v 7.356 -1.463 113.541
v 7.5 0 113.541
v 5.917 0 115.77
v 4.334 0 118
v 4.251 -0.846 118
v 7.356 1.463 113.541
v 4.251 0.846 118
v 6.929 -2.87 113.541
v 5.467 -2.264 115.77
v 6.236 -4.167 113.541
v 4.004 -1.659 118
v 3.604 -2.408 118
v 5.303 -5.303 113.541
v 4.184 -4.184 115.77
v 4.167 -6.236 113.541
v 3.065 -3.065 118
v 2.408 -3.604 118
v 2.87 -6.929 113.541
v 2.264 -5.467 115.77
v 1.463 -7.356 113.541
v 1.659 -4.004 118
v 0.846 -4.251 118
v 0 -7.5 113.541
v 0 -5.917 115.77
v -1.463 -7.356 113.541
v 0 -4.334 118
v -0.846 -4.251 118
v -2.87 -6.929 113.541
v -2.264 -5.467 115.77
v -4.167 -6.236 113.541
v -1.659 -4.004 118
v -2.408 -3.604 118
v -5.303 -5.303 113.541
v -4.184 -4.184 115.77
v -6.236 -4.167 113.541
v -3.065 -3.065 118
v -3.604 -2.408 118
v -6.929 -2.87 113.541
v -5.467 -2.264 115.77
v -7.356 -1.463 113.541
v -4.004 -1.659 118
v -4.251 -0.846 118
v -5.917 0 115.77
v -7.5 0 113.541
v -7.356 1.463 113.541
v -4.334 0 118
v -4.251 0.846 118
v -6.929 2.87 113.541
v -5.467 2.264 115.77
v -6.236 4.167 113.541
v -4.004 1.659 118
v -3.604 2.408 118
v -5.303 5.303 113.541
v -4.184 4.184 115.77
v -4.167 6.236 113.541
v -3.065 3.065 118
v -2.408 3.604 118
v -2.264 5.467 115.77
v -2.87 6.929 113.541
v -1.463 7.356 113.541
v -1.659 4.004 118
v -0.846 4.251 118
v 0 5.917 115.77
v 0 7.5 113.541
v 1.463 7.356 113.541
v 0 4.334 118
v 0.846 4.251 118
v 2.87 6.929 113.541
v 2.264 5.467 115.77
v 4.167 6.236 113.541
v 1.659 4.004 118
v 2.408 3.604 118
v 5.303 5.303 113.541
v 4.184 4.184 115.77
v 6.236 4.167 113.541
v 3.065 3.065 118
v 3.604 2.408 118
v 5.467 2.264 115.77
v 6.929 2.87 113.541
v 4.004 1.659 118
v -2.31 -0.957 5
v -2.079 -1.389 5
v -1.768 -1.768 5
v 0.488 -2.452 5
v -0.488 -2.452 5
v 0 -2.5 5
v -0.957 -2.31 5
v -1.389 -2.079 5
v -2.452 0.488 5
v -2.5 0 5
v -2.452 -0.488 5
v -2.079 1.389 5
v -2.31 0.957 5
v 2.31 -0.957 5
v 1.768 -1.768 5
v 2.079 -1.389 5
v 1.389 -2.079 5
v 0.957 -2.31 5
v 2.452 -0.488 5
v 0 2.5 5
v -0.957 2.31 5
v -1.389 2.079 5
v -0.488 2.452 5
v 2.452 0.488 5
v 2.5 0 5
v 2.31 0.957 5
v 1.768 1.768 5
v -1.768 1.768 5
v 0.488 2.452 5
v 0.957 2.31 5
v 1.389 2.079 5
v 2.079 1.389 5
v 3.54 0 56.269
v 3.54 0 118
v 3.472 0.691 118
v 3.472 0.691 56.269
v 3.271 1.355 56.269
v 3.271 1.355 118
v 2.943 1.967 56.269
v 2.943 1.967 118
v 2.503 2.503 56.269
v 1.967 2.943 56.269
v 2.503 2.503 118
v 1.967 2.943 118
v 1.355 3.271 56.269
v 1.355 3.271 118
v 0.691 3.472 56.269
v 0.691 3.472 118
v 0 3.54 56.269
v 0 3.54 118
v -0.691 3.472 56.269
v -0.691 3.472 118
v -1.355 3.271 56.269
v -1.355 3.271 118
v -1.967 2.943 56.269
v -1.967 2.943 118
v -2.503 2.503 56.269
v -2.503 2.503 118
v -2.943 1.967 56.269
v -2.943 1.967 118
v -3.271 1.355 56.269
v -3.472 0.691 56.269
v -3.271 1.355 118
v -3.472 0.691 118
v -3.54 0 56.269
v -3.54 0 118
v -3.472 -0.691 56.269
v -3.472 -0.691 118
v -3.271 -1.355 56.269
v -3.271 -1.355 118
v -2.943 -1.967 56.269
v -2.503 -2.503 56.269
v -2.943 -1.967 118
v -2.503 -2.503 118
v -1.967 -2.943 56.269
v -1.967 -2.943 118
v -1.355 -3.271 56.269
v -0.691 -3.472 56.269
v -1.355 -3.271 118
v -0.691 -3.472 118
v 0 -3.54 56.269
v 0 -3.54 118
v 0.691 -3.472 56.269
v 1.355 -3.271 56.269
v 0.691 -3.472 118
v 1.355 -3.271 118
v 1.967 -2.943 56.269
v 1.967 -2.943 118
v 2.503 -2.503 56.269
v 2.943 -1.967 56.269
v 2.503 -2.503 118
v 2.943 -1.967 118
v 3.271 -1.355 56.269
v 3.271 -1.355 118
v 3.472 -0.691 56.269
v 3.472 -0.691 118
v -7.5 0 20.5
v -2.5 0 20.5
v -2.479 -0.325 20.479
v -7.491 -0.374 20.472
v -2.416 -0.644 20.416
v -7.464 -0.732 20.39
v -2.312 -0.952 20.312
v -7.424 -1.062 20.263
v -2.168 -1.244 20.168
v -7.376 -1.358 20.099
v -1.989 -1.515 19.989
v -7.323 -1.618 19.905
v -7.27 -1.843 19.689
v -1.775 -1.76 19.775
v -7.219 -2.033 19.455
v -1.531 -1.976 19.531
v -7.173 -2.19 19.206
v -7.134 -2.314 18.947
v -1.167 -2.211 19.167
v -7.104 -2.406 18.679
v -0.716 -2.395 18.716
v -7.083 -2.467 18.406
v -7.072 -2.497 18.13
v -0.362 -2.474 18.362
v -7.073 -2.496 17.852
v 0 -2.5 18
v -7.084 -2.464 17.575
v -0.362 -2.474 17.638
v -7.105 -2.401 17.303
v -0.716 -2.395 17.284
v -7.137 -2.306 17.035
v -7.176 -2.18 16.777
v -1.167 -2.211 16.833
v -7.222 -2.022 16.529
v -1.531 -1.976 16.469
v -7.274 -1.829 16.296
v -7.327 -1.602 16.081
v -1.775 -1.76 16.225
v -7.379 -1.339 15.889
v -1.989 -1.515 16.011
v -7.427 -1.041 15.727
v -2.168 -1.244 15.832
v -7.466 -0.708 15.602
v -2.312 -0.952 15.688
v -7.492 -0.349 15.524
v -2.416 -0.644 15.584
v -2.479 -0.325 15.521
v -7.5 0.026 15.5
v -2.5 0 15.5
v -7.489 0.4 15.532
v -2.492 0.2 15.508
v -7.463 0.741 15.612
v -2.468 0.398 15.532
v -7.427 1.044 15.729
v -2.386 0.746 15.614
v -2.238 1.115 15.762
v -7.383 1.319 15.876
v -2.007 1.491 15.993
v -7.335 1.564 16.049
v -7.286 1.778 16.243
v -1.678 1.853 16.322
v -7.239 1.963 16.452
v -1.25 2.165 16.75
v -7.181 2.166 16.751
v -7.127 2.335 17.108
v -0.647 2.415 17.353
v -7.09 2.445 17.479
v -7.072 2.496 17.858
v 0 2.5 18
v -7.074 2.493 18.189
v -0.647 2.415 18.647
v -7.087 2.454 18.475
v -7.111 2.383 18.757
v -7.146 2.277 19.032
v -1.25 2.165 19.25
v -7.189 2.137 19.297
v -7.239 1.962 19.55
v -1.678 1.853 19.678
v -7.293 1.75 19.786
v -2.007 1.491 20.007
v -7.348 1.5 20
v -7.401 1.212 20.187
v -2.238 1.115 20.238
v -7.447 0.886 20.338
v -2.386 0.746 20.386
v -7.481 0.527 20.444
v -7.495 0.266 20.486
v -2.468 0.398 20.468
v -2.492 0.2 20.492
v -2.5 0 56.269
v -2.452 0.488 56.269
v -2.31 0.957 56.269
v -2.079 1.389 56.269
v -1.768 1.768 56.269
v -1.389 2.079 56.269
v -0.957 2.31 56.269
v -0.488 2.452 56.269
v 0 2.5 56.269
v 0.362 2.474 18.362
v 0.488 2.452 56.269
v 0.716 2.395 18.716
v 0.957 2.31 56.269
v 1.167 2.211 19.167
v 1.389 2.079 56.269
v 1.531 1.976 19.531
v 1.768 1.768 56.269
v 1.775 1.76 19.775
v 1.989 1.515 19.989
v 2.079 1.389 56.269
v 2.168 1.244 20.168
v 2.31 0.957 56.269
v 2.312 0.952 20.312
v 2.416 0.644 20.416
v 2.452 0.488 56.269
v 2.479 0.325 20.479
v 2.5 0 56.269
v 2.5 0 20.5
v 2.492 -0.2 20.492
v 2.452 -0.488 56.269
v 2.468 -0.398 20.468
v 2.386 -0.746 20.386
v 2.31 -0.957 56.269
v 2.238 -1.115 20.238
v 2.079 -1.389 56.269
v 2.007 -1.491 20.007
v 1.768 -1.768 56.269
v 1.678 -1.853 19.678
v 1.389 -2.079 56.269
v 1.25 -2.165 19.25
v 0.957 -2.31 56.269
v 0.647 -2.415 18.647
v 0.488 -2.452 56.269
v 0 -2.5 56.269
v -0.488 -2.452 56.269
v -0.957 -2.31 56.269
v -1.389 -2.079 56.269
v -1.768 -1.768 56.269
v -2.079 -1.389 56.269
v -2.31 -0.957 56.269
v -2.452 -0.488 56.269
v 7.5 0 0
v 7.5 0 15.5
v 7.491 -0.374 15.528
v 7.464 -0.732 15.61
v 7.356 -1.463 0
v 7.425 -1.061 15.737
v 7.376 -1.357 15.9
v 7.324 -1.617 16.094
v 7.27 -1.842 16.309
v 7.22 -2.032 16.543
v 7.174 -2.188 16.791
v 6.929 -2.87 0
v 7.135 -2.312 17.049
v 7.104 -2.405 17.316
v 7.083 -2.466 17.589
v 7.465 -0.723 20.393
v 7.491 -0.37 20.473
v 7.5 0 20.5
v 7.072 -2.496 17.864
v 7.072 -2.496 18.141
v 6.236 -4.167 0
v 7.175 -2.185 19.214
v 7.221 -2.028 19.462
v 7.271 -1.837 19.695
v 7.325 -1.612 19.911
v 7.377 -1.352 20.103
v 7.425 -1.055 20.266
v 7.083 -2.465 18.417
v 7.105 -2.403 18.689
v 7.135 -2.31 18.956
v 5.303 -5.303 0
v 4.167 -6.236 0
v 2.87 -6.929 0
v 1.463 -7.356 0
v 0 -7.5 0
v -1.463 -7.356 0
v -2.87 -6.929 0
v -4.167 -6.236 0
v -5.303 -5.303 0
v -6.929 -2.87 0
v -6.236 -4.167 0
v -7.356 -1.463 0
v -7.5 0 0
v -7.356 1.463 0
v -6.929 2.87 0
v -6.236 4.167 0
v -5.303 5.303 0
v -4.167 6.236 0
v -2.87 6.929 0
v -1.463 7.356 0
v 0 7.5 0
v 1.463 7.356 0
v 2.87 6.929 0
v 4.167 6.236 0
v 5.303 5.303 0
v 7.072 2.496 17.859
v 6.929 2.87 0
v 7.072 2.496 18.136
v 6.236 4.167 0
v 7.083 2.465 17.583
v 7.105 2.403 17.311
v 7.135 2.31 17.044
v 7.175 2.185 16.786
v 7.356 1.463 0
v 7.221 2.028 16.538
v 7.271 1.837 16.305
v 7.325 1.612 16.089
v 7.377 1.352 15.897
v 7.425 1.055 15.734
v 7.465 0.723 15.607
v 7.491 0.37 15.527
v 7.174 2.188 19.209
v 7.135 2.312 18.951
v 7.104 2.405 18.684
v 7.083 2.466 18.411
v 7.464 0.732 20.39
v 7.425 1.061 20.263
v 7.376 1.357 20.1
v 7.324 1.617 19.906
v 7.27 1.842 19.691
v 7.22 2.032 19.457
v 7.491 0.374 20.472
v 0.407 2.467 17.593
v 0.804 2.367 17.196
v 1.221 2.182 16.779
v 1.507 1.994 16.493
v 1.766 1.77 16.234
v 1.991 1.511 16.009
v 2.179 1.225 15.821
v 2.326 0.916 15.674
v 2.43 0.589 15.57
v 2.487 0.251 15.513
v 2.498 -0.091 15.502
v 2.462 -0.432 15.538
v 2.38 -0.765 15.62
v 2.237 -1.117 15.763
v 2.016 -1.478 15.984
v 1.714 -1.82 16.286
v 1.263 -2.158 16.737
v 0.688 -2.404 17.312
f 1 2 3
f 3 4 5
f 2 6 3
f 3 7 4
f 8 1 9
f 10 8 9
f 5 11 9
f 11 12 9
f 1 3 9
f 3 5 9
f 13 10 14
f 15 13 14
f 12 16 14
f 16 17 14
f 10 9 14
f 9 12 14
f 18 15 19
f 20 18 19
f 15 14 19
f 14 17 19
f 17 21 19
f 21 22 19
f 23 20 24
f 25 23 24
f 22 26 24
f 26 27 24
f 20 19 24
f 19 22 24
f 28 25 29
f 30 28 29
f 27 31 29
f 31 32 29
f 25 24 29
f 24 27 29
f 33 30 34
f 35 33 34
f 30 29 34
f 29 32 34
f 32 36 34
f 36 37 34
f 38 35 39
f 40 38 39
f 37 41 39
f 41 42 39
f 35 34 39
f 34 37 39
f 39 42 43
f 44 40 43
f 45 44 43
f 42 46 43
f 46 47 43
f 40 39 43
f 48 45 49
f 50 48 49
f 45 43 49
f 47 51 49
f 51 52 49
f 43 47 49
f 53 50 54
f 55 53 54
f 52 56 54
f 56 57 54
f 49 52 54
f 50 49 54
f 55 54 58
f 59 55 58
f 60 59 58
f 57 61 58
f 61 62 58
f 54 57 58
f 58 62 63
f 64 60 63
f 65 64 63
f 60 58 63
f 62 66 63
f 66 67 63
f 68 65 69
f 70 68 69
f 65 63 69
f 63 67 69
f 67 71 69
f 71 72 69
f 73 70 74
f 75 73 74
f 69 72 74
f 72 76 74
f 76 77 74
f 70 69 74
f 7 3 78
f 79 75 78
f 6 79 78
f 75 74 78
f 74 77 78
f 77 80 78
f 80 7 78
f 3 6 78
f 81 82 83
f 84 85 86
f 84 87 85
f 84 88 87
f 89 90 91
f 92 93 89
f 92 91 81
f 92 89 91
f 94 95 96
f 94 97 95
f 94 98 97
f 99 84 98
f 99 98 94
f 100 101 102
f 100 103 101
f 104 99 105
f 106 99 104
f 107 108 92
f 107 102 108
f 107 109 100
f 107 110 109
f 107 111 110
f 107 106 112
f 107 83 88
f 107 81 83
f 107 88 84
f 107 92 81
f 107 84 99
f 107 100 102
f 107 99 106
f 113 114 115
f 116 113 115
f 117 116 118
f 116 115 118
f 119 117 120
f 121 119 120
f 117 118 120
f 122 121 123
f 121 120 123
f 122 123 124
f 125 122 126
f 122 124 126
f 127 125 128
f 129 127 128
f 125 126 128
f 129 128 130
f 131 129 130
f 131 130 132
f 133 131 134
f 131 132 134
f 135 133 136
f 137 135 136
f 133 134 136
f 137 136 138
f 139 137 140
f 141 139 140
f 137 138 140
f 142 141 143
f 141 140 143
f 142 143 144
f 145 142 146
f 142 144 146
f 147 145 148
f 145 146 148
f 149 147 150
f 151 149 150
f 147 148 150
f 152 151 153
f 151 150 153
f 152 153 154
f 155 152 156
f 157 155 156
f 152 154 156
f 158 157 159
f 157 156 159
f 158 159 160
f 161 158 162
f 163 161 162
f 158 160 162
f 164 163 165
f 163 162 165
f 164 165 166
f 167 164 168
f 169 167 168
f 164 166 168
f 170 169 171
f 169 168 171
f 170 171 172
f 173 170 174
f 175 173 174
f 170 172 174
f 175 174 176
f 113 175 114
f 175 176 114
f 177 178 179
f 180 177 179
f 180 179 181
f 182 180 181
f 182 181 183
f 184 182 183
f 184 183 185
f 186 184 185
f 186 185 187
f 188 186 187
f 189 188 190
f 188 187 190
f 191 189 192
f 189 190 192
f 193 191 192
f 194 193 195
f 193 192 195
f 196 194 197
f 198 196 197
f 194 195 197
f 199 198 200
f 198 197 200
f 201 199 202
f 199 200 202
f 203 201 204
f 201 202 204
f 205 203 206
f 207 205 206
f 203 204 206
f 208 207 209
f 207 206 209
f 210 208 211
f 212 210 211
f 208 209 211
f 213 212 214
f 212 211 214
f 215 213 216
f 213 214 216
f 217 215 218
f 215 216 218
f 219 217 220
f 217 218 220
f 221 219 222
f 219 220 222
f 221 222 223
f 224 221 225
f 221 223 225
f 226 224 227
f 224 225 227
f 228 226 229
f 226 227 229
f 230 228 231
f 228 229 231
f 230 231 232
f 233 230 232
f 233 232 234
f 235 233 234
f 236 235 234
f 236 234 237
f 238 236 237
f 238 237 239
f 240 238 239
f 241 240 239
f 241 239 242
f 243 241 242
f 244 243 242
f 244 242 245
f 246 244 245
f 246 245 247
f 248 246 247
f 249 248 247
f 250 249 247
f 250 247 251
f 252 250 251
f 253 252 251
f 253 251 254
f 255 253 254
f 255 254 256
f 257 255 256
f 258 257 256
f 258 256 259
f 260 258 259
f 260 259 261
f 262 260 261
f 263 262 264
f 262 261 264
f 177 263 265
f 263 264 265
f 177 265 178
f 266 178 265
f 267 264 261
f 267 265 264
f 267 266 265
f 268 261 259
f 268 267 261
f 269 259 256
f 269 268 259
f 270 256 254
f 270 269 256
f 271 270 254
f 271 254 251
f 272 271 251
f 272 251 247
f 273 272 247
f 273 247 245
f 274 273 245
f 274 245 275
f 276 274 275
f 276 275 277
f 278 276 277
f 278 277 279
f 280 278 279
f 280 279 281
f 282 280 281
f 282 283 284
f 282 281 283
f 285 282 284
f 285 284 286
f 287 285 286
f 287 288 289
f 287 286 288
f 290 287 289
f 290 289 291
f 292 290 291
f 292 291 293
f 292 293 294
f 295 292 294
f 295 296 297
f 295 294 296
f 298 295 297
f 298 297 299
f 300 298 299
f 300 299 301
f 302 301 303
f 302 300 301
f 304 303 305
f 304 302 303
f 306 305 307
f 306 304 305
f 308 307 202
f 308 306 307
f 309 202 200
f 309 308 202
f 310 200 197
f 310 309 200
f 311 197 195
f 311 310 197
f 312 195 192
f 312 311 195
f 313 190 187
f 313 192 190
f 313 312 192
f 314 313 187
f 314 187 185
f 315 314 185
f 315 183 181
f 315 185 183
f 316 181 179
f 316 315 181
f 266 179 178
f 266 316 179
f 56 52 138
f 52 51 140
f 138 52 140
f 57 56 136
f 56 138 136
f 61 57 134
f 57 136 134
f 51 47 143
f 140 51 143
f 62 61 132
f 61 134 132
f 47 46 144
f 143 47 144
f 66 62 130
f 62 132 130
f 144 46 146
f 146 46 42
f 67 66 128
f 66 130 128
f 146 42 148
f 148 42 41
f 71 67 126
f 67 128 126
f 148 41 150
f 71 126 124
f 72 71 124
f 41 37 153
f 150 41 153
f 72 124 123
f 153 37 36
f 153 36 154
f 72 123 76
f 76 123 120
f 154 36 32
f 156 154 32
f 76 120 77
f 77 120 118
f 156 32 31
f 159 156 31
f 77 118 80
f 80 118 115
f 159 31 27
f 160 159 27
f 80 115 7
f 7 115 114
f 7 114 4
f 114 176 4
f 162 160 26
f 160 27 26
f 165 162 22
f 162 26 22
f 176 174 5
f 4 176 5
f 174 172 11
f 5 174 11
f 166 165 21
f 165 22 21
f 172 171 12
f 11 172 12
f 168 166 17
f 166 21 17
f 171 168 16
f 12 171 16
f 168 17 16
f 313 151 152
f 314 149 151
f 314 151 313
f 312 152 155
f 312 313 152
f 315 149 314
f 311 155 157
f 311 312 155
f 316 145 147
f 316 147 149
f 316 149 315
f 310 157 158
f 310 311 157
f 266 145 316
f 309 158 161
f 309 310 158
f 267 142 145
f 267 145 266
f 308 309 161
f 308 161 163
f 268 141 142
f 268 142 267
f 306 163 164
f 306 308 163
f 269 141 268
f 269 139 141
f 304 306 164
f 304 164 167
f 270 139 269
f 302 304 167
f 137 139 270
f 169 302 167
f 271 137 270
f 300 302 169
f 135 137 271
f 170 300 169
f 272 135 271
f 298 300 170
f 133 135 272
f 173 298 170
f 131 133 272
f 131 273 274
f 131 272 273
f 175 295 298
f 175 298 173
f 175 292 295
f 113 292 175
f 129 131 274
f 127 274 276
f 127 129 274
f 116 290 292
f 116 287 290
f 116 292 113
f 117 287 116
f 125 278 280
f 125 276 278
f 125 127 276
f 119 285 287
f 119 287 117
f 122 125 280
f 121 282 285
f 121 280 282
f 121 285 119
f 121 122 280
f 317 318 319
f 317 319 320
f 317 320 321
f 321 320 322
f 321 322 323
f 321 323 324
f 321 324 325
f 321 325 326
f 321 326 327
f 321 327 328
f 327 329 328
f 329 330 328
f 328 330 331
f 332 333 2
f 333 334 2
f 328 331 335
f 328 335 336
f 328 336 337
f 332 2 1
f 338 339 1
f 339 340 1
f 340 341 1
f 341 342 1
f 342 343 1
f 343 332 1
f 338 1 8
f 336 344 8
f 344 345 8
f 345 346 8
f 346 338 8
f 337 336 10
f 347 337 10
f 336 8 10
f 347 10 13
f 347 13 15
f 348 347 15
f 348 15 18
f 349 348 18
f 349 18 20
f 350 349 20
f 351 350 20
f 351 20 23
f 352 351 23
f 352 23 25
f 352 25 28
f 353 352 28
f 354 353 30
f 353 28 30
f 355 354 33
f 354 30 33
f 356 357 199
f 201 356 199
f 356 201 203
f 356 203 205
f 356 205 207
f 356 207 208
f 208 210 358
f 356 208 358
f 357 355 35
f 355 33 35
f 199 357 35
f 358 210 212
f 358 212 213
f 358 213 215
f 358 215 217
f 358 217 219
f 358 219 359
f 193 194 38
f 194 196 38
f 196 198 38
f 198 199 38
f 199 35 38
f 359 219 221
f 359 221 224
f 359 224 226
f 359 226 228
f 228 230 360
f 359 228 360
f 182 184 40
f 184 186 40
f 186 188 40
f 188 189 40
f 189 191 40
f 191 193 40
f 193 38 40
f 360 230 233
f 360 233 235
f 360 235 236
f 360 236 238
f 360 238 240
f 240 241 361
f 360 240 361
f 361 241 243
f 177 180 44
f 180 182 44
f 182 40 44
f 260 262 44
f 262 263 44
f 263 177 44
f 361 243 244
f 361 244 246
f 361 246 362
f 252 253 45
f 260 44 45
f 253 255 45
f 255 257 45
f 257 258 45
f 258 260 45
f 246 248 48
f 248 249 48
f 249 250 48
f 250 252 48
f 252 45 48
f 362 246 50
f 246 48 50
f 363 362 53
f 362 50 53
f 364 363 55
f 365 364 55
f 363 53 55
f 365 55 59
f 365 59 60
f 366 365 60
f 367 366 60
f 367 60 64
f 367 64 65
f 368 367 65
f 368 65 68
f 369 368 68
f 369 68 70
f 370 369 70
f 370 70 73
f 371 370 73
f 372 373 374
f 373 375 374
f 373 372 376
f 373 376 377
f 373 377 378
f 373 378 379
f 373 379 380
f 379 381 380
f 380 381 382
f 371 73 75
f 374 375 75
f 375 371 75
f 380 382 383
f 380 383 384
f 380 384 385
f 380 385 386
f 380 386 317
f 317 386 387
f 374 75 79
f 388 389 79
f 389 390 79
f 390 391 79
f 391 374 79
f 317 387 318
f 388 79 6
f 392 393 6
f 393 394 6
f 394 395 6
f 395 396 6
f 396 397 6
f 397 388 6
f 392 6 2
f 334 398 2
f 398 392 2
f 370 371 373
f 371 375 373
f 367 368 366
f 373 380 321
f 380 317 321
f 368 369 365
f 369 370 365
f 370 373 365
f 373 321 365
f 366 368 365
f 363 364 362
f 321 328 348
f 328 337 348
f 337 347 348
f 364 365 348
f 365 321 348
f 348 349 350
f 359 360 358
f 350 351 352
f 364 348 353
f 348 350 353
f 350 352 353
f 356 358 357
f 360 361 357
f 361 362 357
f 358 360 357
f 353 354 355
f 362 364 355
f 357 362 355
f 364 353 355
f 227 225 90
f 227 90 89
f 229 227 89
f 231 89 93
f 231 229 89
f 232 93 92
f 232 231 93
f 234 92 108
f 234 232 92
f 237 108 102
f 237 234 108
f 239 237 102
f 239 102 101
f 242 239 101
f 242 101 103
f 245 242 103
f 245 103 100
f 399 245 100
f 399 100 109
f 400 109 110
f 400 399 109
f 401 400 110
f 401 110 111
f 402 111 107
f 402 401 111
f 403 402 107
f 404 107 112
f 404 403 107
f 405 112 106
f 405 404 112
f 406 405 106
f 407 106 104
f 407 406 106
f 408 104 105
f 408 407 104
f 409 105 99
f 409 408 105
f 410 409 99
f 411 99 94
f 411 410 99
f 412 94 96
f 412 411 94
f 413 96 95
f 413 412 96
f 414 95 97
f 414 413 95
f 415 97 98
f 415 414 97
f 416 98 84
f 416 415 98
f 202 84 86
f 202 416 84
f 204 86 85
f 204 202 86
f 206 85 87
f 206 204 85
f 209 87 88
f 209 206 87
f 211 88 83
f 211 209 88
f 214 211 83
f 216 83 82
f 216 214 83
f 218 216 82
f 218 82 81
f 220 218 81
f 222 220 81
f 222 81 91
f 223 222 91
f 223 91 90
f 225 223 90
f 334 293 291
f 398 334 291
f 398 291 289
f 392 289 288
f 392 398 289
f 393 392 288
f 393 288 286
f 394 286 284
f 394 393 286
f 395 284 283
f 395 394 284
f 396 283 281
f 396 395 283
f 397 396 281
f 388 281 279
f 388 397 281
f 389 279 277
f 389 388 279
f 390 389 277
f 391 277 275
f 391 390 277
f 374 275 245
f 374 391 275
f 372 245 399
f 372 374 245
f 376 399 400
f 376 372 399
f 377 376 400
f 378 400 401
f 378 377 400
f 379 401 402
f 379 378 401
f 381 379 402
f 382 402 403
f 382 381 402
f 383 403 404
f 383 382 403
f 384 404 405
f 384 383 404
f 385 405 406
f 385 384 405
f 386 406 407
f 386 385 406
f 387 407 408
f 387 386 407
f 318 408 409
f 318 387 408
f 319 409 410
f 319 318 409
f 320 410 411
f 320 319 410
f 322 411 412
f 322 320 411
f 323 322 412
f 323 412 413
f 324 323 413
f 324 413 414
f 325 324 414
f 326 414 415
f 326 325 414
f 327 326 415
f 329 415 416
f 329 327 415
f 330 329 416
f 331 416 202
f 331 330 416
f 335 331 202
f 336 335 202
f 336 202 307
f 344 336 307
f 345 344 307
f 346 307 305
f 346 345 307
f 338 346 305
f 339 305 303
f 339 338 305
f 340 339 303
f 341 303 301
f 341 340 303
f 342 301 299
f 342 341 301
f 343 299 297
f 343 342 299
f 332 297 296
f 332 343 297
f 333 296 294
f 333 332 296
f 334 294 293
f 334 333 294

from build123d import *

# Parameters (mm, degrees)
CROQUIS2_W                        = 2.5
CROQUIS2_H                        = 108
CROQUIS3_W                        = 7.5
CROQUIS3_H                        = 2.5
DI_METRO_DE_TALADRO_5_0_5_1_D     = 5
DI_METRO_DE_TALADRO_5_0_5_1_DEPTH = 15
CHAFL_N1_SIZE                     = 0.747946905
CHAFL_N1_SIZE2                    = 1.053583954
CROQUIS5_R                        = 3.54
CORTAR_EXTRUIR1_DEPTH             = 61.731439717


# Read off the part's stored shape, not the designer's step: Sólido importado2
with BuildPart() as part:
    # Croquis1 → Revolución1 (revolve)
    with BuildSketch(Plane.XZ):
        Polygon((4.334336082, 118), (0, 118), (0, 0), (7.5, 0), (7.5, 113.540736), align=None)
    revolve(axis=Axis((0, 0, 118), (0, 0, -1)))

    # Croquis2 → Cortar-Revolución1 (revolve, cut)
    with BuildSketch(Plane.XZ, mode=Mode.PRIVATE) as cortar_revoluci_n1_sk:
        with Locations((1.25, 59)):
            Rectangle(CROQUIS2_W, CROQUIS2_H)
    revolve(cortar_revoluci_n1_sk.sketch.rotate(Axis((0, 0, 113), (0, 0, -1)), 180), axis=Axis((0, 0, 113), (0, 0, -1)), mode=Mode.SUBTRACT)

    # Croquis3 → Cortar-Revolución2 (revolve, cut)
    with BuildSketch(Plane.XY.offset(18), mode=Mode.PRIVATE) as cortar_revoluci_n2_sk:
        with Locations((3.75, -1.25)):
            Rectangle(CROQUIS3_W, CROQUIS3_H)
    revolve(cortar_revoluci_n2_sk.sketch.rotate(Axis((7.5, 0, 18), (-1, 0, 0)), 90), axis=Axis((7.5, 0, 18), (-1, 0, 0)), mode=Mode.SUBTRACT)

    # Diámetro de taladro Ø5.0 (5)1
    with Locations(Plane(origin=(-7.5, 0, 18), x_dir=(0, 0, -1), z_dir=(-1, 0, 0))):
        with Locations((0, 0)):
            Hole(DI_METRO_DE_TALADRO_5_0_5_1_D / 2, depth=DI_METRO_DE_TALADRO_5_0_5_1_DEPTH)

    # Chaflán1
    chafl_n1_edges = [part.edges().sort_by_distance(p)[0] for p in [
        (2.5, 0, 113),
    ]]
    chafl_n1_side = [part.faces().sort_by_distance(p)[0] for p in [
        (0, 0, 113),
    ]]
    chamfer(chafl_n1_edges, length=CHAFL_N1_SIZE, length2=CHAFL_N1_SIZE2, reference=chafl_n1_side[0])

    # Croquis5 → Cortar-Extruir1 (cut)
    with BuildSketch(Plane.XY.offset(118)):
        Circle(CROQUIS5_R)
    extrude(amount=-CORTAR_EXTRUIR1_DEPTH, mode=Mode.SUBTRACT)


solid = part.part
